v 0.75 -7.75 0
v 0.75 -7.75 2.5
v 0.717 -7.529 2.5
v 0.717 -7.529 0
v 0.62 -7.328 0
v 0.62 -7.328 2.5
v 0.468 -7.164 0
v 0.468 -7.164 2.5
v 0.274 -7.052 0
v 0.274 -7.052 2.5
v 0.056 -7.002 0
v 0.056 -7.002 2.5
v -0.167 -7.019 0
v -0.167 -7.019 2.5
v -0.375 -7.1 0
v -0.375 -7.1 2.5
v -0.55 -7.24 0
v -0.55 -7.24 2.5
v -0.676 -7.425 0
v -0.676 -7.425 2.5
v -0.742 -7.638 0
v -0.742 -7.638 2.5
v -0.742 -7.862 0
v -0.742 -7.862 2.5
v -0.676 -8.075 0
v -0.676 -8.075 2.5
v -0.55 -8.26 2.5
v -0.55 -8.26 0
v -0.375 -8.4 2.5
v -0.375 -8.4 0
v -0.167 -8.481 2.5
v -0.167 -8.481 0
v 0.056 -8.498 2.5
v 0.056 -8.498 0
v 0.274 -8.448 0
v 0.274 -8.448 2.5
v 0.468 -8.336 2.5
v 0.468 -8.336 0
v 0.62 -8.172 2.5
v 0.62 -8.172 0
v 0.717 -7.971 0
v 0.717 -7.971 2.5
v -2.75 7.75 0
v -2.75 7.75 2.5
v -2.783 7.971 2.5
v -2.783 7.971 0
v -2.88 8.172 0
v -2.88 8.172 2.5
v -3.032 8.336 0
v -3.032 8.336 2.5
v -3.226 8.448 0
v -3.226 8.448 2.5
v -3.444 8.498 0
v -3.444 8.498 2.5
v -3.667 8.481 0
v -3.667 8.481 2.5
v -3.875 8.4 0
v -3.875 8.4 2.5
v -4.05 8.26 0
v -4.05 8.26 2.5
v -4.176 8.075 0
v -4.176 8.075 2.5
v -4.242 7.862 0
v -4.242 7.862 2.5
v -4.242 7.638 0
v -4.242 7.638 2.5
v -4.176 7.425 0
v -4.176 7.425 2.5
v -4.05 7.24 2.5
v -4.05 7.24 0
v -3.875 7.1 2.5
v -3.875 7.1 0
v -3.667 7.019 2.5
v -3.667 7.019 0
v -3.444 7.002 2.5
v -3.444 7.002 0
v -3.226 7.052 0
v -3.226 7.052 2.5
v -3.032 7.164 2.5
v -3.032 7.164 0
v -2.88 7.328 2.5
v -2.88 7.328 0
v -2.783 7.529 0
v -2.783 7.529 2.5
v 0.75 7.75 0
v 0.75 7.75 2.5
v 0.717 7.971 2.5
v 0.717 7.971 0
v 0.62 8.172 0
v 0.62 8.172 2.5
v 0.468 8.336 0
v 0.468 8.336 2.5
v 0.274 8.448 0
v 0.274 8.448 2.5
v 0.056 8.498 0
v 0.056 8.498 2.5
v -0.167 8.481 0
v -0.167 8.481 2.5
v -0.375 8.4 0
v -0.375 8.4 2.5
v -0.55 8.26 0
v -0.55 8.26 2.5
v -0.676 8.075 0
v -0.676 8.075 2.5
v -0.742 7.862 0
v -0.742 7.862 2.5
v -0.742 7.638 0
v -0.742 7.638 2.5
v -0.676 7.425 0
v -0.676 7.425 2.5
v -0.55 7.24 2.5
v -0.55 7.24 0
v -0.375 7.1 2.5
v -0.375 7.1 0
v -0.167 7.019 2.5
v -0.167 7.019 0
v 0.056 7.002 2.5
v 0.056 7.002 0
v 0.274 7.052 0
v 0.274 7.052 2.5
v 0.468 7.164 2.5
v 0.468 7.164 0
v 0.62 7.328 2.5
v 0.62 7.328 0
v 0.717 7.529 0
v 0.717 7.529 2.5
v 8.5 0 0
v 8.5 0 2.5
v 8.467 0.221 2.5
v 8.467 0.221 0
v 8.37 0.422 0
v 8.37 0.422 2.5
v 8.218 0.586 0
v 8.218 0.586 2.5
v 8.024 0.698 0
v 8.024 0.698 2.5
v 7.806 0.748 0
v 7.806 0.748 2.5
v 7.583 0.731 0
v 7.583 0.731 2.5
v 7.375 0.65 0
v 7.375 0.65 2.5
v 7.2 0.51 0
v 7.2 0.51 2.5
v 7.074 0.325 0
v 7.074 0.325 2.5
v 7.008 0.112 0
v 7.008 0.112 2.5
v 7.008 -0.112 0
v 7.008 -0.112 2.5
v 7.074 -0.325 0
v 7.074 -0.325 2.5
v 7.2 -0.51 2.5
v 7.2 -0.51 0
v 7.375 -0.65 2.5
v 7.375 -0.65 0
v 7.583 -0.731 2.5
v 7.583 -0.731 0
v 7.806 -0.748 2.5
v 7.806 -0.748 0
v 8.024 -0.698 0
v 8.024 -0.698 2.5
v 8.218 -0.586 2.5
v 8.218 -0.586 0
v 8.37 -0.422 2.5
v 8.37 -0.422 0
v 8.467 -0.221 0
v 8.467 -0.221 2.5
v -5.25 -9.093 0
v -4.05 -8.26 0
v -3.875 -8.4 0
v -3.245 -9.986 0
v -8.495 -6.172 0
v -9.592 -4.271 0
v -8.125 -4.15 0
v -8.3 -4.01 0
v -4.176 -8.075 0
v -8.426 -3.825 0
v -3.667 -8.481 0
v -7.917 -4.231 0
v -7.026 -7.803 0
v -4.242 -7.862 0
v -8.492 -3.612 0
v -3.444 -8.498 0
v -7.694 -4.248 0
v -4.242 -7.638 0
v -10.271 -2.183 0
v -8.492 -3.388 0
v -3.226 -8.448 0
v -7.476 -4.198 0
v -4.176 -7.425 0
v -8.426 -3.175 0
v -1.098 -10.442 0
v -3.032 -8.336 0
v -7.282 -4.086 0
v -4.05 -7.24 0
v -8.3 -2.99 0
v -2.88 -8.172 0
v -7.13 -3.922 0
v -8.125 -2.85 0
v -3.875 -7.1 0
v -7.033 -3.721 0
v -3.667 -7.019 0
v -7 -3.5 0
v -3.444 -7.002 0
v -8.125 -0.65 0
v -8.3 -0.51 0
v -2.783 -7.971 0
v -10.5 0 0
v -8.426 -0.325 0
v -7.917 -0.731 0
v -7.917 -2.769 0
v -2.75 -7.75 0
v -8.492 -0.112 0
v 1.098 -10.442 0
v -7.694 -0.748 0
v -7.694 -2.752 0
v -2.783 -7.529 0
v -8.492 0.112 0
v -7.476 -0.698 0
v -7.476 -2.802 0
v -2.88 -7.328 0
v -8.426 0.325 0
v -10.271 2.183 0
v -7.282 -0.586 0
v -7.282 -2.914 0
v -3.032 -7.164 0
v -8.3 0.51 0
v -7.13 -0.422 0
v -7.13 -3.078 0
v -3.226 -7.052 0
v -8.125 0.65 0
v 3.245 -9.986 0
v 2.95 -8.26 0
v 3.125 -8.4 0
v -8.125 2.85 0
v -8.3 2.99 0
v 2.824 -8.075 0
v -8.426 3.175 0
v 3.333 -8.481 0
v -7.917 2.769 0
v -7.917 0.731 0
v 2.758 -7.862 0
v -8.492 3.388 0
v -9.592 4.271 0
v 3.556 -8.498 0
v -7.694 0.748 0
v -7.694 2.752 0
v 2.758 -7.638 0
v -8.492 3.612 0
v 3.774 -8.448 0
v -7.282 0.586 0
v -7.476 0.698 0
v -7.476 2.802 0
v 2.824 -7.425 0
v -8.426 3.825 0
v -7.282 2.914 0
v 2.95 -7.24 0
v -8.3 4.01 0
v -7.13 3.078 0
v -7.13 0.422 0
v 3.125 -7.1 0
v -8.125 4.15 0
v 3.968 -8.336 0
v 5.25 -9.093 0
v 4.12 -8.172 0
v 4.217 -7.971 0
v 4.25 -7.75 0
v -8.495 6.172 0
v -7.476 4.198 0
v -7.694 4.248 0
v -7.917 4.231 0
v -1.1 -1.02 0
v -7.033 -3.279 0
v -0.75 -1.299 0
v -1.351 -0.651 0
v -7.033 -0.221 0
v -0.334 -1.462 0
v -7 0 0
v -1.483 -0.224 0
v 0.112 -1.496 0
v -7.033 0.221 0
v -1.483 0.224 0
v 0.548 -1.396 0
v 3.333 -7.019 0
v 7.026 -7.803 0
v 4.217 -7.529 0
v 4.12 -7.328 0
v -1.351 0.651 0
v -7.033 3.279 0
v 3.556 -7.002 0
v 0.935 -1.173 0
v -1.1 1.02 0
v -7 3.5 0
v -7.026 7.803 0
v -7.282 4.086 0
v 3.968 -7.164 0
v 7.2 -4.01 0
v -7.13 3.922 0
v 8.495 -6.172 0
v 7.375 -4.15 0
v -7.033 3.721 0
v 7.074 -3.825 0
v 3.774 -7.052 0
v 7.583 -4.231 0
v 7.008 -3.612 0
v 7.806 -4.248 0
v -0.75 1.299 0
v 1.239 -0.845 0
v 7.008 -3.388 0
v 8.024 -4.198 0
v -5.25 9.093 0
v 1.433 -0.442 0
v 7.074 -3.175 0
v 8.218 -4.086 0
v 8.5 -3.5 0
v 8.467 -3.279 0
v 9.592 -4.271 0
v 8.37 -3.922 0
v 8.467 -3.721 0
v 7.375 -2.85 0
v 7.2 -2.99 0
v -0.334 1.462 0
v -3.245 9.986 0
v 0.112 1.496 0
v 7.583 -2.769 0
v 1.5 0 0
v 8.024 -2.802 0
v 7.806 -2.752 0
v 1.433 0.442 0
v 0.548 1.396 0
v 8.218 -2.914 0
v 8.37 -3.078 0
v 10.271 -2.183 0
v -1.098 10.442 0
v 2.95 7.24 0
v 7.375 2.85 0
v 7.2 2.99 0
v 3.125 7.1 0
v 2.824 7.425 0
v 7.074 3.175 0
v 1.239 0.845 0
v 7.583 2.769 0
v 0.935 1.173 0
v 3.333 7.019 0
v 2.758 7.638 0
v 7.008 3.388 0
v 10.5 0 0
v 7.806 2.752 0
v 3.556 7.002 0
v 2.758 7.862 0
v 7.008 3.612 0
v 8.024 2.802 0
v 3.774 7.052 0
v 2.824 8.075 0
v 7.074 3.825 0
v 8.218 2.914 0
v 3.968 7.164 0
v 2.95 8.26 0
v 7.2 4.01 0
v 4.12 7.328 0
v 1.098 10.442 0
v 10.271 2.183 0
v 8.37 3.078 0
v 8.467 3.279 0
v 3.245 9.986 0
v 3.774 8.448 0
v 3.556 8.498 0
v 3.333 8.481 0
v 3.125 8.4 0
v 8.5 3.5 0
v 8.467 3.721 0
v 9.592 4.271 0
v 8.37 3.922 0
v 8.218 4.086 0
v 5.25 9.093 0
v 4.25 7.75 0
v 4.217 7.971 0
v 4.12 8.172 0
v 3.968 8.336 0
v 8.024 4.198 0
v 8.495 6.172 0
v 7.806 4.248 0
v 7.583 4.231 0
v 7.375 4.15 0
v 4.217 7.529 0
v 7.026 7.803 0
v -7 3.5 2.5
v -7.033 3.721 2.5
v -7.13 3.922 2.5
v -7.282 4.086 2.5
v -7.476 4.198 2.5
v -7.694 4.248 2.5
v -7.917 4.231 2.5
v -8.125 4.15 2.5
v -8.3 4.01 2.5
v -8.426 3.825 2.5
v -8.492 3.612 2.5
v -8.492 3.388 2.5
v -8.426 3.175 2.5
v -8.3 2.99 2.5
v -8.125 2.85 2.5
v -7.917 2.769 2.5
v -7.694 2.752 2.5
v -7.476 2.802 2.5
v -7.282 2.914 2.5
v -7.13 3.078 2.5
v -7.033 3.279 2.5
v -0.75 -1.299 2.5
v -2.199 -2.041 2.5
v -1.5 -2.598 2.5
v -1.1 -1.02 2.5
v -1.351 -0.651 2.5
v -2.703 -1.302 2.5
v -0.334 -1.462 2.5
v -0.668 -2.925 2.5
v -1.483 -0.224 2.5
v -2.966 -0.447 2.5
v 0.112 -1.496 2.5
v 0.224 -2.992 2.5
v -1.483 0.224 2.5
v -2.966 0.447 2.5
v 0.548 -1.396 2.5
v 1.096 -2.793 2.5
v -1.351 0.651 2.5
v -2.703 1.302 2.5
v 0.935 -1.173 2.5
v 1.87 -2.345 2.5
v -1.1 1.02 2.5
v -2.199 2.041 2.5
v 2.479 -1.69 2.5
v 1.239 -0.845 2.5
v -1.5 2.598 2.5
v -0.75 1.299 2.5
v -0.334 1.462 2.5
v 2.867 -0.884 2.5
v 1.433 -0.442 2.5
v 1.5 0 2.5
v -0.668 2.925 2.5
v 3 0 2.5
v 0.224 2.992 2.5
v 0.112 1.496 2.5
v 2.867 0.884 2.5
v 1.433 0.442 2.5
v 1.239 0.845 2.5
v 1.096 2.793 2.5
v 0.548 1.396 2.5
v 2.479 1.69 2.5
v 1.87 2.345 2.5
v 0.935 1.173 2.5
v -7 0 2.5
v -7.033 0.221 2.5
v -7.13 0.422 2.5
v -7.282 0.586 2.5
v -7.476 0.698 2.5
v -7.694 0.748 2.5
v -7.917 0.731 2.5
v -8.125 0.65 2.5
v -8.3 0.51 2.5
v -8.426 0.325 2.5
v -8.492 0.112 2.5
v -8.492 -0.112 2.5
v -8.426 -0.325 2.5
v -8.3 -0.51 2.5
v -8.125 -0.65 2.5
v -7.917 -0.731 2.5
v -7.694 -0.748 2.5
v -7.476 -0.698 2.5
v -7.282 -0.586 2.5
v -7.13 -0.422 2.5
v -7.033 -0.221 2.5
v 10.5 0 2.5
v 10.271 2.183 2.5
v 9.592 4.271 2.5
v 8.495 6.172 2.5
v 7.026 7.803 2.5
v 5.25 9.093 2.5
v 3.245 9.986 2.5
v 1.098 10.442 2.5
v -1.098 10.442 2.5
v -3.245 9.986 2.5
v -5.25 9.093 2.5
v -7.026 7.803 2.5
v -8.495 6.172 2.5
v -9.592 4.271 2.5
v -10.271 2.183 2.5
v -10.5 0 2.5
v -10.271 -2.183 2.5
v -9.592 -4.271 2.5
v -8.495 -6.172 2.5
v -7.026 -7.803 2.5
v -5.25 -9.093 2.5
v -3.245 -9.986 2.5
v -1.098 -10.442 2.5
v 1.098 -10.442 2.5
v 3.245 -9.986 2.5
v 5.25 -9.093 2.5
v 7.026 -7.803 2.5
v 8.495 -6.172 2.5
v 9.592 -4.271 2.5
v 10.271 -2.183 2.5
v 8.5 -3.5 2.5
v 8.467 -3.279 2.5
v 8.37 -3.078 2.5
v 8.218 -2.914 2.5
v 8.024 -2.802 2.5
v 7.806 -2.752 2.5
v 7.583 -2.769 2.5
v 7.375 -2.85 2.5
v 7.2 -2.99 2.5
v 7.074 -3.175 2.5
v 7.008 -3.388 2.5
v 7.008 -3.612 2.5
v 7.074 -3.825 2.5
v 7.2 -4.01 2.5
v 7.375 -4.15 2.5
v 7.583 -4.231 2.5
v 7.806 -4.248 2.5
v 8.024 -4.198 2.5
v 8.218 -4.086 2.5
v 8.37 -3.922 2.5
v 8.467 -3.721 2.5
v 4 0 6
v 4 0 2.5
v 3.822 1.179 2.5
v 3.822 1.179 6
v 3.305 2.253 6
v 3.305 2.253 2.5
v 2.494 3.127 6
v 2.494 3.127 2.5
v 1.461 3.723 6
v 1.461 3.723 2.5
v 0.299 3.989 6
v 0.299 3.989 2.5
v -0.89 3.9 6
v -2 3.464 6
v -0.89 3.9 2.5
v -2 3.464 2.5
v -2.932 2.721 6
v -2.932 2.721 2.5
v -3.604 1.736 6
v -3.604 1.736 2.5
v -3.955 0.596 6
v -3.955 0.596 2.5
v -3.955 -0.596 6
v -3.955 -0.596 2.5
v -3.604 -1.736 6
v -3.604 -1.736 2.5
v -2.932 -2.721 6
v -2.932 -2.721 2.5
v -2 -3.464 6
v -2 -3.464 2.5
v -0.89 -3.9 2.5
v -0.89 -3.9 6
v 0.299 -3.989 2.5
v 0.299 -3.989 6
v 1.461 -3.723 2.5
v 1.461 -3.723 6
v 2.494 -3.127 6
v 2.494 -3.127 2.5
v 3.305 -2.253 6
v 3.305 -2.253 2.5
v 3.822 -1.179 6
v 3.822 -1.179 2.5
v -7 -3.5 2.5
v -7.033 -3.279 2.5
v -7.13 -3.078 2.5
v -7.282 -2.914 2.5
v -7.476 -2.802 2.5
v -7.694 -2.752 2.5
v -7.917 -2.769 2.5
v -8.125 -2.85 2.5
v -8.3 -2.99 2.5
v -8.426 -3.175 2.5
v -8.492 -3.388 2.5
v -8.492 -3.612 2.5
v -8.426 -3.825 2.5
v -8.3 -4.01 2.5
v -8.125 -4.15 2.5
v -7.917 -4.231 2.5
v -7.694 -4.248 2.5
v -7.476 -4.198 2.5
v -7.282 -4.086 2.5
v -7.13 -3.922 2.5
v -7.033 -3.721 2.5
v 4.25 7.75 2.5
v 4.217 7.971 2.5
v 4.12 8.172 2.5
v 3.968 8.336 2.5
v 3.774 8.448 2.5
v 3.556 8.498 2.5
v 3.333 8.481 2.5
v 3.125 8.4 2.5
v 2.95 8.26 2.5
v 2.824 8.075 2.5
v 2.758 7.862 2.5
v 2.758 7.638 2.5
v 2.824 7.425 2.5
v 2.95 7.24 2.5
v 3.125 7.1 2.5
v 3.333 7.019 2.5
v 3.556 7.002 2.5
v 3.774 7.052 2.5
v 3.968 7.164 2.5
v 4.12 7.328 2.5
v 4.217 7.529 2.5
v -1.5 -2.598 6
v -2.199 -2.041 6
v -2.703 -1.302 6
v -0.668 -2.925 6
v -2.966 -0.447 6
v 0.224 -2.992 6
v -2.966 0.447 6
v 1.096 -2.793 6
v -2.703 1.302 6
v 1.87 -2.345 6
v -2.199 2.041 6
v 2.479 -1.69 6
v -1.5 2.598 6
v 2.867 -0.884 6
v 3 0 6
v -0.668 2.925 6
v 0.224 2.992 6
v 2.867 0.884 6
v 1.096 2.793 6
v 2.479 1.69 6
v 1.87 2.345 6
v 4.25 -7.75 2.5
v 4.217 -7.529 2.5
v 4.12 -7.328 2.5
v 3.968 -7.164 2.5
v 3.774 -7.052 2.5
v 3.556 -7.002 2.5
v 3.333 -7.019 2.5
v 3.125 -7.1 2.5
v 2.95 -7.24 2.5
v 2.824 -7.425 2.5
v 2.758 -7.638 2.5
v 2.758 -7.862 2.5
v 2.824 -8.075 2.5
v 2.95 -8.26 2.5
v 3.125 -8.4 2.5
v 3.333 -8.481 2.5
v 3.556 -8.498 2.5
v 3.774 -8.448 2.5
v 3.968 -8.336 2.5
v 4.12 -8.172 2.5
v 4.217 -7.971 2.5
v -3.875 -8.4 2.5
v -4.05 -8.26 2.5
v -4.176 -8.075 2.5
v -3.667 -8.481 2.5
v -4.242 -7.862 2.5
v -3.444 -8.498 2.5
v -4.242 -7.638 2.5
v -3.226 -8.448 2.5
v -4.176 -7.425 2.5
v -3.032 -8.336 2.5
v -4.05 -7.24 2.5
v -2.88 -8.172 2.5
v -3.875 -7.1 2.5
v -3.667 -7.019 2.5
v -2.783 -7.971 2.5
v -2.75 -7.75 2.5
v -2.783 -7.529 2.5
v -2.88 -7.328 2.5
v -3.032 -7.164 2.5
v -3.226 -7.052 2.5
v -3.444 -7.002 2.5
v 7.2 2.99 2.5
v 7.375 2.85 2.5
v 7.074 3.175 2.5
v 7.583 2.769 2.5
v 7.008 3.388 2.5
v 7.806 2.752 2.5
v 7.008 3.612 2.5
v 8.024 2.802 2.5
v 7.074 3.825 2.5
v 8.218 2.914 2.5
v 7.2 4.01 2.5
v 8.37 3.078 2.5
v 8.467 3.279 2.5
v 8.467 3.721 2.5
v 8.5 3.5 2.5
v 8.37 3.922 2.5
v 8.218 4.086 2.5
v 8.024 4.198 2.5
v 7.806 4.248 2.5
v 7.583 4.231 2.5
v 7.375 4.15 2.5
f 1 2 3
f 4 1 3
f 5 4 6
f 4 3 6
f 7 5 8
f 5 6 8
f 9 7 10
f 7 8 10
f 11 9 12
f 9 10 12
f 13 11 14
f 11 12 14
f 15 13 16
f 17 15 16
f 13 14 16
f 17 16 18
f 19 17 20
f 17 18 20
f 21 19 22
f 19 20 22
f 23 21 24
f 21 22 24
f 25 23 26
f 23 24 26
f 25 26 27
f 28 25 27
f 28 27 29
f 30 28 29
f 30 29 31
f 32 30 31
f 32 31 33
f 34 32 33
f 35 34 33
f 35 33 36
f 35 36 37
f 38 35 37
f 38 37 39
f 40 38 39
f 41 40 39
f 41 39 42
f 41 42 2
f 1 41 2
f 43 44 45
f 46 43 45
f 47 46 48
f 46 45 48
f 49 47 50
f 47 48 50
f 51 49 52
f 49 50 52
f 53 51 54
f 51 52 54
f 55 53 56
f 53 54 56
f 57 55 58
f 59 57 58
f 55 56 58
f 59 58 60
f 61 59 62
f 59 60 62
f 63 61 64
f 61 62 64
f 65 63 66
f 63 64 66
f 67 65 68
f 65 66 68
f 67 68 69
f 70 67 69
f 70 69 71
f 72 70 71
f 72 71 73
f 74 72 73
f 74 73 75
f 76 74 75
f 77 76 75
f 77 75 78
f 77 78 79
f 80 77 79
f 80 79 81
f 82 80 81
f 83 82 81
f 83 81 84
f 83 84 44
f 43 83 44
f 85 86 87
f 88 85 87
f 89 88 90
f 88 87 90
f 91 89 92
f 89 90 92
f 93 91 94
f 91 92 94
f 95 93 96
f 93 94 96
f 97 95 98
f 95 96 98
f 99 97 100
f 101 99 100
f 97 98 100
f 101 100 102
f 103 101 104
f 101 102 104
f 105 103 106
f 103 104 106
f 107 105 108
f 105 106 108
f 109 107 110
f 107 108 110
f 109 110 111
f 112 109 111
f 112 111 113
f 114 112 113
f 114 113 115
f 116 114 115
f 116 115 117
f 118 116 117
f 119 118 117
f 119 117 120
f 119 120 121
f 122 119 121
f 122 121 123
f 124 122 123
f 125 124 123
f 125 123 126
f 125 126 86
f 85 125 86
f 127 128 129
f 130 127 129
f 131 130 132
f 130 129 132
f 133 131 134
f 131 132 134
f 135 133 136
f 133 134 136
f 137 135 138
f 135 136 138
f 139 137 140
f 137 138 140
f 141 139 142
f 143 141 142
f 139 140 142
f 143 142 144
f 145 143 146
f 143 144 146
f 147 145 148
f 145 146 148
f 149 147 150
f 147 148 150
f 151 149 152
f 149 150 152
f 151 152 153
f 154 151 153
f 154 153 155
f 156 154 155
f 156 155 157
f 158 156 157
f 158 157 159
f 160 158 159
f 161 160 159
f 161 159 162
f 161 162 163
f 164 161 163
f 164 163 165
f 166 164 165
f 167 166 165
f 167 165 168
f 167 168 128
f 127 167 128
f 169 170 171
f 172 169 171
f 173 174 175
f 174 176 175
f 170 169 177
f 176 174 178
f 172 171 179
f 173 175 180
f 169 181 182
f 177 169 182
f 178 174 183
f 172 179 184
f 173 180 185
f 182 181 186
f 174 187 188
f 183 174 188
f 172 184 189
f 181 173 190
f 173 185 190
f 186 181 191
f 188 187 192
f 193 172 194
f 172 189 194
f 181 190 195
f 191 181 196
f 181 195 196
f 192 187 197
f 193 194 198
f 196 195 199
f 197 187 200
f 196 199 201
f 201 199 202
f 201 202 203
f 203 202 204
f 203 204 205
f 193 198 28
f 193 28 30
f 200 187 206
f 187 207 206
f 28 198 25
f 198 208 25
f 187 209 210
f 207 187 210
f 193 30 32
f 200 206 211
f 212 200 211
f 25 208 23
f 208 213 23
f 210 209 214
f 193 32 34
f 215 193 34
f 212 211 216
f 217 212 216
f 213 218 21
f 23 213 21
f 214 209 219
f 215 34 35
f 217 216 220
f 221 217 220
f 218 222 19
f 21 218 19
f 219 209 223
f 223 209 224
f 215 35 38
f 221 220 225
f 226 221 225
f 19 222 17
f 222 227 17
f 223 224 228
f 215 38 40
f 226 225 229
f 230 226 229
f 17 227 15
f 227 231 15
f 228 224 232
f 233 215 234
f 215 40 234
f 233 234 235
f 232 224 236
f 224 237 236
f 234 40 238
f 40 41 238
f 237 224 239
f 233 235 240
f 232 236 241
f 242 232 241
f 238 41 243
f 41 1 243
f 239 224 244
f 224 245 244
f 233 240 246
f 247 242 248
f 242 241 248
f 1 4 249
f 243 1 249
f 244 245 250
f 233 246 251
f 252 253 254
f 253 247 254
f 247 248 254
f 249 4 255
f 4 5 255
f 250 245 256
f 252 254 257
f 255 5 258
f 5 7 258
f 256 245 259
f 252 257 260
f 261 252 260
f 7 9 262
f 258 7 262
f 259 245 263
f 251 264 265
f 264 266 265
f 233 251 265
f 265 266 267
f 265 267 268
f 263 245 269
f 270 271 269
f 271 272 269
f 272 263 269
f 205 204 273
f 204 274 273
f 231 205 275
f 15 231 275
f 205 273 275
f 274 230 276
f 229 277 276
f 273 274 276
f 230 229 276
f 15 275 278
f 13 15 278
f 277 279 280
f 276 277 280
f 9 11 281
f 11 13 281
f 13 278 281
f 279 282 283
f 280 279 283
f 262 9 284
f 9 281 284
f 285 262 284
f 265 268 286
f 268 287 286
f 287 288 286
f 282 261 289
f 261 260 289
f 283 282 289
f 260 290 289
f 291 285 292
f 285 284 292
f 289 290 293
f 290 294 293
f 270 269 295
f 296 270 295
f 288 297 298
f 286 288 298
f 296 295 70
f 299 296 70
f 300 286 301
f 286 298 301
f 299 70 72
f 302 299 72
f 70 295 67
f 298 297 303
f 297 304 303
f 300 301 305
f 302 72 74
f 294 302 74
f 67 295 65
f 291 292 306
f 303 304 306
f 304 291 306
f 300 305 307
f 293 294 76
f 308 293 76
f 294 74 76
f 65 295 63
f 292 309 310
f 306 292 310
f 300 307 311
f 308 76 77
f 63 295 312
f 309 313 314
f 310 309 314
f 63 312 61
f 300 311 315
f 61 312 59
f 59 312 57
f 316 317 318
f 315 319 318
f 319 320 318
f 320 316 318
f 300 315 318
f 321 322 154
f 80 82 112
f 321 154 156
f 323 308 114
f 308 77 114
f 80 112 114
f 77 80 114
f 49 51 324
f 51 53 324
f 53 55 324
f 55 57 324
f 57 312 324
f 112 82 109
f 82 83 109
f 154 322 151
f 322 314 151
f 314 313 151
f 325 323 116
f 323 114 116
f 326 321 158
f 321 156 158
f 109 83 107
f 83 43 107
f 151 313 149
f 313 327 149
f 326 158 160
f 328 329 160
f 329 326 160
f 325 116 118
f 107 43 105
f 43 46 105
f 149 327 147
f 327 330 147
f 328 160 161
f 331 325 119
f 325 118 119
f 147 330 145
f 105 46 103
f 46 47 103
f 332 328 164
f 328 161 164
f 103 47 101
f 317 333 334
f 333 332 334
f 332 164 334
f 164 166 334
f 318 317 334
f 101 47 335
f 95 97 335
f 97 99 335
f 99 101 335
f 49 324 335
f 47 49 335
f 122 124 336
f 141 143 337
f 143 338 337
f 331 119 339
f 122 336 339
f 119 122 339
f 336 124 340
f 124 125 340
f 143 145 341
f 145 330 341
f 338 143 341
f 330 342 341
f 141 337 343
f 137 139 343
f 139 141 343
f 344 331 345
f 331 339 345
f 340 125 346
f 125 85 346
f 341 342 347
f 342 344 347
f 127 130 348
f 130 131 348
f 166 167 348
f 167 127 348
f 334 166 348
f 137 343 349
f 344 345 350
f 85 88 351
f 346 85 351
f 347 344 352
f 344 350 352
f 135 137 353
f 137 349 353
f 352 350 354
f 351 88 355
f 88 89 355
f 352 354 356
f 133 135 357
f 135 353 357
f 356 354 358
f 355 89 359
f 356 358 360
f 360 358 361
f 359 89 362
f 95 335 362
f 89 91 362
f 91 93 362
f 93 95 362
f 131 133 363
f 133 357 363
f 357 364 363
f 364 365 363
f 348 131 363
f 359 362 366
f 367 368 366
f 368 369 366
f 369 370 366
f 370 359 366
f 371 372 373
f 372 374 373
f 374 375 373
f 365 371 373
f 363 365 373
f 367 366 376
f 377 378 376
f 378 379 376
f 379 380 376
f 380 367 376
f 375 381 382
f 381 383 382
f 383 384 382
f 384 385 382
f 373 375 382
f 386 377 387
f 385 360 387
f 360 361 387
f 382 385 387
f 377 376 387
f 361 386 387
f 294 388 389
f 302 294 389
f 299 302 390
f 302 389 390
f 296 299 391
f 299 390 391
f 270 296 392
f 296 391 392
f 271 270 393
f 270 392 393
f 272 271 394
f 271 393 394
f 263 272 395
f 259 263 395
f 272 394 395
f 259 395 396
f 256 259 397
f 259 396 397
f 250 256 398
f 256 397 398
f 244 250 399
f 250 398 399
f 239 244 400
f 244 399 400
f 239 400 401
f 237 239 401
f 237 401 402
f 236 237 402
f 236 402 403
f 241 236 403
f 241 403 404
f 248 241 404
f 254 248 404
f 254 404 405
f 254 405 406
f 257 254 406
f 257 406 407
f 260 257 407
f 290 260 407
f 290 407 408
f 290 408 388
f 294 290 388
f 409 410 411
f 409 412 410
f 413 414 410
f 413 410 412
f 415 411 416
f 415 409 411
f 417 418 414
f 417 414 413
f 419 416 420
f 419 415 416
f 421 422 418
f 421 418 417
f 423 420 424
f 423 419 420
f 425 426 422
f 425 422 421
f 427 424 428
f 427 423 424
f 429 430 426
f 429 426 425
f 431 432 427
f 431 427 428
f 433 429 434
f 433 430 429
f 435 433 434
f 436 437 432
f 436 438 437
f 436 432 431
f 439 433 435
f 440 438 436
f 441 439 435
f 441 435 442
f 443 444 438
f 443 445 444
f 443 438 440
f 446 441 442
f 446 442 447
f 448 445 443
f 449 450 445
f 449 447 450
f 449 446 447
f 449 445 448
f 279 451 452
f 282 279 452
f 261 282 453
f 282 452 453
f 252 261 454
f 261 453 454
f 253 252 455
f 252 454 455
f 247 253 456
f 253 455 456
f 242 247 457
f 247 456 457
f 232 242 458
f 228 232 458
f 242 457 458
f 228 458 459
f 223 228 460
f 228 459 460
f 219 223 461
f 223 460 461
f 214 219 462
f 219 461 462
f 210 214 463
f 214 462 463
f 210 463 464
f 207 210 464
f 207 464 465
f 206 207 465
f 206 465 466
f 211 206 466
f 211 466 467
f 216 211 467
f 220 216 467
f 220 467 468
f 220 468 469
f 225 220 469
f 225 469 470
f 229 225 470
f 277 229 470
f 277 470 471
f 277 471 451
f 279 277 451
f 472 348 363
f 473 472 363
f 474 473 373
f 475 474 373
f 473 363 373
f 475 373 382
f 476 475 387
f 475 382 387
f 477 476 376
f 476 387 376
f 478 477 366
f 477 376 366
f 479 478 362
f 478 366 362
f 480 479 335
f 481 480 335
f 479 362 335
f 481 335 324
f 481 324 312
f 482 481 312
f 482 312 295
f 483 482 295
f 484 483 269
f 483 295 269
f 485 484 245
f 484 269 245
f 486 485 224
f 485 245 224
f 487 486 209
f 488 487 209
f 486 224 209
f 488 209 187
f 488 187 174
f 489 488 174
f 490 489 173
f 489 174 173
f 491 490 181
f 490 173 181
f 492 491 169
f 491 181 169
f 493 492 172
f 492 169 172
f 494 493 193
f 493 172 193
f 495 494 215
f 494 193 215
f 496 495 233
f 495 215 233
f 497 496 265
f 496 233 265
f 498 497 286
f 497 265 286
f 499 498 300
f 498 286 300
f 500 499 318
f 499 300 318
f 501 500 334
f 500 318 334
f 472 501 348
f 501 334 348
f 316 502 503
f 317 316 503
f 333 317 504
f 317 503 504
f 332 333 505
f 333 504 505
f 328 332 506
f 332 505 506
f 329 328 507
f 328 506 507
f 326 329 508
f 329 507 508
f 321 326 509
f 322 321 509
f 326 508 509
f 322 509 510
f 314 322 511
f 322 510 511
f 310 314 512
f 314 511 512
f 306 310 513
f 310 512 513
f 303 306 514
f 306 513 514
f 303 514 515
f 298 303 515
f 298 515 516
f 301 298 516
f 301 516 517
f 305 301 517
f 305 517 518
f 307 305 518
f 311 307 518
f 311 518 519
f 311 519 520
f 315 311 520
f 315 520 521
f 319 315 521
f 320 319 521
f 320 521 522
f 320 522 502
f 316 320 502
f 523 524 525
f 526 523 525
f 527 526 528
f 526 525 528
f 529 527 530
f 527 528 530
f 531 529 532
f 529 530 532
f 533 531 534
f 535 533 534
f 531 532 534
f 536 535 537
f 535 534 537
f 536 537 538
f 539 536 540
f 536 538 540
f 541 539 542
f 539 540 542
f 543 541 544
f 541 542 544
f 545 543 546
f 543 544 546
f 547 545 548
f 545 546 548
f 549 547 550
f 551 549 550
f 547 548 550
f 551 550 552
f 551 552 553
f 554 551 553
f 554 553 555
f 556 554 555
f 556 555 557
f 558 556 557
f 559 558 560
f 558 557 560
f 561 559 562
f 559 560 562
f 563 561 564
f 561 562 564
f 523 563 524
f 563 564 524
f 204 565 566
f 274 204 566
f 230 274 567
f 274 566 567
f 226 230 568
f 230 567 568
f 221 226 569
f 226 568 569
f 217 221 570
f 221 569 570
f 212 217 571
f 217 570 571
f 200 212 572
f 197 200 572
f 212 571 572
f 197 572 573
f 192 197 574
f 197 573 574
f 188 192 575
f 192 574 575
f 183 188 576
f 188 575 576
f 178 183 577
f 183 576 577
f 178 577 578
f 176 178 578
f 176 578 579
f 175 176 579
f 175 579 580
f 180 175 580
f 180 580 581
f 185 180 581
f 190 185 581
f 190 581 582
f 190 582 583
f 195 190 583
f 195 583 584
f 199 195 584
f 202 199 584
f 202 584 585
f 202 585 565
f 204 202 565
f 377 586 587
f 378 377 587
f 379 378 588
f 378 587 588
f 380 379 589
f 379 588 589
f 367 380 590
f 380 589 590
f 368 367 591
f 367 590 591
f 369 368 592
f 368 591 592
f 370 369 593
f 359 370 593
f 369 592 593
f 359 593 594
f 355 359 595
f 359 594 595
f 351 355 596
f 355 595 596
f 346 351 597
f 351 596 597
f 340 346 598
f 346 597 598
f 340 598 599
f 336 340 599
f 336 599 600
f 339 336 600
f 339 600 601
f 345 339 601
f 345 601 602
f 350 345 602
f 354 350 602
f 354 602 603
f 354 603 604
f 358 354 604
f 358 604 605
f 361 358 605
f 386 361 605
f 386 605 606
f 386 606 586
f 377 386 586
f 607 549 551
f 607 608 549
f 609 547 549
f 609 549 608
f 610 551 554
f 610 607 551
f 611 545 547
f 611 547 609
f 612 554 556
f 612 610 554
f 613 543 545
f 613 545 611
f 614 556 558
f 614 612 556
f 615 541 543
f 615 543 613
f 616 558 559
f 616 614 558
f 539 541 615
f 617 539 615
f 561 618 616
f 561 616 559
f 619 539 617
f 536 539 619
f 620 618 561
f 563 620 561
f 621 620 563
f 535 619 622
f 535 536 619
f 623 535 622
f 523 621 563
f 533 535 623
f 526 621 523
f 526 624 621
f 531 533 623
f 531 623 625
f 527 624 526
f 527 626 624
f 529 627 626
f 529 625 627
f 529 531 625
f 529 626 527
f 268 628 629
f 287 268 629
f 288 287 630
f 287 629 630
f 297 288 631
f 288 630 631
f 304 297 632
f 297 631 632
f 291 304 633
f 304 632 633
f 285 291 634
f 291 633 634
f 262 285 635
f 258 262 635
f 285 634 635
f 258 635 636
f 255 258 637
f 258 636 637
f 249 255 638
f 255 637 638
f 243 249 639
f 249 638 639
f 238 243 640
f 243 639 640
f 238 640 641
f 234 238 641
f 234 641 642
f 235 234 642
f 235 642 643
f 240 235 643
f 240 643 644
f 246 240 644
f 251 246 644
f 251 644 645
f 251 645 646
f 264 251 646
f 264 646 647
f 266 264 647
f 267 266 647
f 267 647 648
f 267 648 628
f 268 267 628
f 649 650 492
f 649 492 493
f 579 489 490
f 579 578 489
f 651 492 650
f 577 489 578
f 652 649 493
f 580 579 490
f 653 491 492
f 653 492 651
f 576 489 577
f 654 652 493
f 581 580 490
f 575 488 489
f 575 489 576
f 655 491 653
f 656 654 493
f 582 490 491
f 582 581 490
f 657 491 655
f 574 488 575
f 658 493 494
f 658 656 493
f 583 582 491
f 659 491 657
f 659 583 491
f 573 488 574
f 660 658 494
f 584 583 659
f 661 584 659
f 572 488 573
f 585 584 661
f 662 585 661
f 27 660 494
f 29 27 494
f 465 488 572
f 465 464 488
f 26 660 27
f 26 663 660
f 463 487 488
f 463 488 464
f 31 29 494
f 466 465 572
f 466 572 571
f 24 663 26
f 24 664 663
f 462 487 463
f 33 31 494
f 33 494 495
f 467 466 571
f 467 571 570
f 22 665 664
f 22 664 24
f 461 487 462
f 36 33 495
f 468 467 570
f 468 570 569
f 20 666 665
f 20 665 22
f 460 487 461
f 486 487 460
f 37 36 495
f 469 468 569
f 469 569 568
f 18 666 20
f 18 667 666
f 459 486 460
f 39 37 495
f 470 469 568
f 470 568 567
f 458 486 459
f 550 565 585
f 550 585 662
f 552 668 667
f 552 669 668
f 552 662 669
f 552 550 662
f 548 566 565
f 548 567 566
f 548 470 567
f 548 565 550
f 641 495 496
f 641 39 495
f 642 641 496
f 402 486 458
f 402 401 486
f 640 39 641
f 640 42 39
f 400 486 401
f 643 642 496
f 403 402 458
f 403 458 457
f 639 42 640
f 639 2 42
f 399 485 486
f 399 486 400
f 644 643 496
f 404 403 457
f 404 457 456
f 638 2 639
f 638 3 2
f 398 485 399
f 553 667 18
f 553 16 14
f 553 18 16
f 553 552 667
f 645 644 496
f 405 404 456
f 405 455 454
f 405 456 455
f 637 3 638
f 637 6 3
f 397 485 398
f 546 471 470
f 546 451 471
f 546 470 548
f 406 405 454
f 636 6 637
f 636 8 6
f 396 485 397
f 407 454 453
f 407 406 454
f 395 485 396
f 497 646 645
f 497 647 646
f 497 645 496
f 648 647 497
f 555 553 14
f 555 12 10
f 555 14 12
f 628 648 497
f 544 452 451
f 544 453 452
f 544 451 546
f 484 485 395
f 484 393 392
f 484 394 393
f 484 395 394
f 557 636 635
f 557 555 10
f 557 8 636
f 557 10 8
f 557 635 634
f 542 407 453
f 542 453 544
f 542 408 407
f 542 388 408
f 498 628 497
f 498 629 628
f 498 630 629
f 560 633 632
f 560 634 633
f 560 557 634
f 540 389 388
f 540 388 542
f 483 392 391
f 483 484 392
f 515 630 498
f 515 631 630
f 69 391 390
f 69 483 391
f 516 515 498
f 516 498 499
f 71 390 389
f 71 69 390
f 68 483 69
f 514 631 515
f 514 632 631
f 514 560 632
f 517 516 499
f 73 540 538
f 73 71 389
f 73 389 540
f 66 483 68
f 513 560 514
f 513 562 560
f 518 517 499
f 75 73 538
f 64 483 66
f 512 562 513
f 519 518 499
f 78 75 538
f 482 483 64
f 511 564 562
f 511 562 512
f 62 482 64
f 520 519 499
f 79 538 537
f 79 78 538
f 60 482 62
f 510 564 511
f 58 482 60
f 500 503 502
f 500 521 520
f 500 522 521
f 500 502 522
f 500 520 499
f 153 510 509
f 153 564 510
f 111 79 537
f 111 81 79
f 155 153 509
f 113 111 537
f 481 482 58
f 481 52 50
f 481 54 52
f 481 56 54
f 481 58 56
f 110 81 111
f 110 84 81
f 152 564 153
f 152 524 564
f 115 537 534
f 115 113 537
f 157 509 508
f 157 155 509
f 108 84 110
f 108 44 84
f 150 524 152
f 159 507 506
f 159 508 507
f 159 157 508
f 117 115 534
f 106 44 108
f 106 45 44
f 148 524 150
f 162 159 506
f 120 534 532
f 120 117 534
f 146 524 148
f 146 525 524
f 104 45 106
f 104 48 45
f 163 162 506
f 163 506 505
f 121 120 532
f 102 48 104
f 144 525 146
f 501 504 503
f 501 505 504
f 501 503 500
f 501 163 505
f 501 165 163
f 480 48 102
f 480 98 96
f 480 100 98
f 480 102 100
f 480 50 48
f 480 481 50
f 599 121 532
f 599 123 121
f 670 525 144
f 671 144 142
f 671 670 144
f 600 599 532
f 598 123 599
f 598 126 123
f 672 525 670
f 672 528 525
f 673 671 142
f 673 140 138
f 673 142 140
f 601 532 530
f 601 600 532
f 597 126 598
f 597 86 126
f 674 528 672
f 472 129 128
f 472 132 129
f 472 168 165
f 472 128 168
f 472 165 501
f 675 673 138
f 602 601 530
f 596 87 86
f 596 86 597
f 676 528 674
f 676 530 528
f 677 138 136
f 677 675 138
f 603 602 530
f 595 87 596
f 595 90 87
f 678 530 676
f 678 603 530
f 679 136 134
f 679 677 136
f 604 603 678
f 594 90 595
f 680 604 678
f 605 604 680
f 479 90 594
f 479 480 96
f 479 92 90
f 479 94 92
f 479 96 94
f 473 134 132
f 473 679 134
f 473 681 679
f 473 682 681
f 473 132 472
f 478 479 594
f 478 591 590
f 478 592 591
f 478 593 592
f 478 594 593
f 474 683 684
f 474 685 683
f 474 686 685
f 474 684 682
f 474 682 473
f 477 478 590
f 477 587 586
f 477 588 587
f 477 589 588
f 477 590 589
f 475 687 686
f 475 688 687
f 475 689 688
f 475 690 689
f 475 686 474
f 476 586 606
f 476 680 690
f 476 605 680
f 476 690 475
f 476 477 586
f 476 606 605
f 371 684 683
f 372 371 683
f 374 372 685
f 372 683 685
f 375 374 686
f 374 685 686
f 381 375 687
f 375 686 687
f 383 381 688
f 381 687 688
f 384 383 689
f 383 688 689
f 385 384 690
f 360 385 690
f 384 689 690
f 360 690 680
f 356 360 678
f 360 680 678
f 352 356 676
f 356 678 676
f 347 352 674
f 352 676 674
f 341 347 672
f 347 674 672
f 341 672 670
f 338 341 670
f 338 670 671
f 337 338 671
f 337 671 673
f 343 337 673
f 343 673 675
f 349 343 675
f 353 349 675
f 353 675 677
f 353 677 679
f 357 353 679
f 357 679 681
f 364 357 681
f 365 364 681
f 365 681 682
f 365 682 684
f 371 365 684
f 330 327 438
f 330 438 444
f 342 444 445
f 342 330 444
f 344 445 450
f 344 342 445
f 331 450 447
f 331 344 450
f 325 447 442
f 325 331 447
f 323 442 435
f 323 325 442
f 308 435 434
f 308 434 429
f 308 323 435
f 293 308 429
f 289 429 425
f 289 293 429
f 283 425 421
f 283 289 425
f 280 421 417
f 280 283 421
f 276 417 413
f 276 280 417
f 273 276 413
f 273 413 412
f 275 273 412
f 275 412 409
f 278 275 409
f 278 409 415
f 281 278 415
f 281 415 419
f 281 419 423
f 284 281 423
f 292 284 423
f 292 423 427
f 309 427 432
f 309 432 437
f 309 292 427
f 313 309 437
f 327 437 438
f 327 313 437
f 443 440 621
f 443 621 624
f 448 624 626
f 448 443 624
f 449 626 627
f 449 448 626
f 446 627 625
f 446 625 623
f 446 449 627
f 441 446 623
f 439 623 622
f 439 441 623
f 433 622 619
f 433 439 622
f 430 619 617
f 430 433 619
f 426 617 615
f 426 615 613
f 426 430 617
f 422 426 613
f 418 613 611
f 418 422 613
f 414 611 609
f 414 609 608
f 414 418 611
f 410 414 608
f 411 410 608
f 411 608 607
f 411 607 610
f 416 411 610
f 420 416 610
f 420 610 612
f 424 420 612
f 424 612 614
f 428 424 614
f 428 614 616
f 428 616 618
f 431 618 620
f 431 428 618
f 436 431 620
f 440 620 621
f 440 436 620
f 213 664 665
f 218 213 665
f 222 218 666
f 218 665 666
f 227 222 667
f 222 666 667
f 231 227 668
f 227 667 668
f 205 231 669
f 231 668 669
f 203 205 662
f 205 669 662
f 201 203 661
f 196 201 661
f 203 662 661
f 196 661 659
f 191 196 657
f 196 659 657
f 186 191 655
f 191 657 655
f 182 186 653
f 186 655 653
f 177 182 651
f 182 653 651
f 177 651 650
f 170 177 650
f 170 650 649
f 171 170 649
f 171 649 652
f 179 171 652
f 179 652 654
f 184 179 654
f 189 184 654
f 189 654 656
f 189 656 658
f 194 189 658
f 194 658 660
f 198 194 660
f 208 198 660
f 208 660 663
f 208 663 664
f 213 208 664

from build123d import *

# Parameters (mm, degrees)
CROQUIS1_R              = 10.5
CROQUIS1_R_2            = 1.5
SALIENTE_EXTRUIR1_DEPTH = 2.5
CROQUIS2_R              = 4
CROQUIS2_R_2            = 3
SALIENTE_EXTRUIR2_DEPTH = 3.5
CROQUIS3_R              = 0.75
CORTAR_EXTRUIR1_DEPTH   = 3.5


with BuildPart() as part:
    # Croquis1 → Saliente-Extruir1 (new body)
    with BuildSketch(Plane.XY):
        Circle(CROQUIS1_R)
        Circle(CROQUIS1_R_2, mode=Mode.SUBTRACT)
    extrude(amount=SALIENTE_EXTRUIR1_DEPTH)

    # Croquis2 → Saliente-Extruir2 (add)
    with BuildSketch(Plane.XY.offset(2.5)):
        Circle(CROQUIS2_R)
        Circle(CROQUIS2_R_2, mode=Mode.SUBTRACT)
    extrude(amount=SALIENTE_EXTRUIR2_DEPTH)

    # Croquis3 → Cortar-Extruir1 (cut)
    with BuildSketch(Plane.XY.offset(2.5)):
        with Locations((-7.75, 0)):
            Circle(CROQUIS3_R)
        with Locations((-7.75, 3.5)):
            Circle(CROQUIS3_R)
        with Locations((-7.75, -3.5)):
            Circle(CROQUIS3_R)
        with Locations((3.5, 7.75)):
            Circle(CROQUIS3_R)
        with Locations((0, 7.75)):
            Circle(CROQUIS3_R)
        with Locations((-3.5, 7.75)):
            Circle(CROQUIS3_R)
        with Locations((7.75, -3.5)):
            Circle(CROQUIS3_R)
        with Locations((7.75, 0)):
            Circle(CROQUIS3_R)
        with Locations((7.75, 3.5)):
            Circle(CROQUIS3_R)
        with Locations((-3.5, -7.75)):
            Circle(CROQUIS3_R)
        with Locations((0, -7.75)):
            Circle(CROQUIS3_R)
        with Locations((3.5, -7.75)):
            Circle(CROQUIS3_R)
    extrude(amount=-CORTAR_EXTRUIR1_DEPTH, mode=Mode.SUBTRACT)


solid = part.part
